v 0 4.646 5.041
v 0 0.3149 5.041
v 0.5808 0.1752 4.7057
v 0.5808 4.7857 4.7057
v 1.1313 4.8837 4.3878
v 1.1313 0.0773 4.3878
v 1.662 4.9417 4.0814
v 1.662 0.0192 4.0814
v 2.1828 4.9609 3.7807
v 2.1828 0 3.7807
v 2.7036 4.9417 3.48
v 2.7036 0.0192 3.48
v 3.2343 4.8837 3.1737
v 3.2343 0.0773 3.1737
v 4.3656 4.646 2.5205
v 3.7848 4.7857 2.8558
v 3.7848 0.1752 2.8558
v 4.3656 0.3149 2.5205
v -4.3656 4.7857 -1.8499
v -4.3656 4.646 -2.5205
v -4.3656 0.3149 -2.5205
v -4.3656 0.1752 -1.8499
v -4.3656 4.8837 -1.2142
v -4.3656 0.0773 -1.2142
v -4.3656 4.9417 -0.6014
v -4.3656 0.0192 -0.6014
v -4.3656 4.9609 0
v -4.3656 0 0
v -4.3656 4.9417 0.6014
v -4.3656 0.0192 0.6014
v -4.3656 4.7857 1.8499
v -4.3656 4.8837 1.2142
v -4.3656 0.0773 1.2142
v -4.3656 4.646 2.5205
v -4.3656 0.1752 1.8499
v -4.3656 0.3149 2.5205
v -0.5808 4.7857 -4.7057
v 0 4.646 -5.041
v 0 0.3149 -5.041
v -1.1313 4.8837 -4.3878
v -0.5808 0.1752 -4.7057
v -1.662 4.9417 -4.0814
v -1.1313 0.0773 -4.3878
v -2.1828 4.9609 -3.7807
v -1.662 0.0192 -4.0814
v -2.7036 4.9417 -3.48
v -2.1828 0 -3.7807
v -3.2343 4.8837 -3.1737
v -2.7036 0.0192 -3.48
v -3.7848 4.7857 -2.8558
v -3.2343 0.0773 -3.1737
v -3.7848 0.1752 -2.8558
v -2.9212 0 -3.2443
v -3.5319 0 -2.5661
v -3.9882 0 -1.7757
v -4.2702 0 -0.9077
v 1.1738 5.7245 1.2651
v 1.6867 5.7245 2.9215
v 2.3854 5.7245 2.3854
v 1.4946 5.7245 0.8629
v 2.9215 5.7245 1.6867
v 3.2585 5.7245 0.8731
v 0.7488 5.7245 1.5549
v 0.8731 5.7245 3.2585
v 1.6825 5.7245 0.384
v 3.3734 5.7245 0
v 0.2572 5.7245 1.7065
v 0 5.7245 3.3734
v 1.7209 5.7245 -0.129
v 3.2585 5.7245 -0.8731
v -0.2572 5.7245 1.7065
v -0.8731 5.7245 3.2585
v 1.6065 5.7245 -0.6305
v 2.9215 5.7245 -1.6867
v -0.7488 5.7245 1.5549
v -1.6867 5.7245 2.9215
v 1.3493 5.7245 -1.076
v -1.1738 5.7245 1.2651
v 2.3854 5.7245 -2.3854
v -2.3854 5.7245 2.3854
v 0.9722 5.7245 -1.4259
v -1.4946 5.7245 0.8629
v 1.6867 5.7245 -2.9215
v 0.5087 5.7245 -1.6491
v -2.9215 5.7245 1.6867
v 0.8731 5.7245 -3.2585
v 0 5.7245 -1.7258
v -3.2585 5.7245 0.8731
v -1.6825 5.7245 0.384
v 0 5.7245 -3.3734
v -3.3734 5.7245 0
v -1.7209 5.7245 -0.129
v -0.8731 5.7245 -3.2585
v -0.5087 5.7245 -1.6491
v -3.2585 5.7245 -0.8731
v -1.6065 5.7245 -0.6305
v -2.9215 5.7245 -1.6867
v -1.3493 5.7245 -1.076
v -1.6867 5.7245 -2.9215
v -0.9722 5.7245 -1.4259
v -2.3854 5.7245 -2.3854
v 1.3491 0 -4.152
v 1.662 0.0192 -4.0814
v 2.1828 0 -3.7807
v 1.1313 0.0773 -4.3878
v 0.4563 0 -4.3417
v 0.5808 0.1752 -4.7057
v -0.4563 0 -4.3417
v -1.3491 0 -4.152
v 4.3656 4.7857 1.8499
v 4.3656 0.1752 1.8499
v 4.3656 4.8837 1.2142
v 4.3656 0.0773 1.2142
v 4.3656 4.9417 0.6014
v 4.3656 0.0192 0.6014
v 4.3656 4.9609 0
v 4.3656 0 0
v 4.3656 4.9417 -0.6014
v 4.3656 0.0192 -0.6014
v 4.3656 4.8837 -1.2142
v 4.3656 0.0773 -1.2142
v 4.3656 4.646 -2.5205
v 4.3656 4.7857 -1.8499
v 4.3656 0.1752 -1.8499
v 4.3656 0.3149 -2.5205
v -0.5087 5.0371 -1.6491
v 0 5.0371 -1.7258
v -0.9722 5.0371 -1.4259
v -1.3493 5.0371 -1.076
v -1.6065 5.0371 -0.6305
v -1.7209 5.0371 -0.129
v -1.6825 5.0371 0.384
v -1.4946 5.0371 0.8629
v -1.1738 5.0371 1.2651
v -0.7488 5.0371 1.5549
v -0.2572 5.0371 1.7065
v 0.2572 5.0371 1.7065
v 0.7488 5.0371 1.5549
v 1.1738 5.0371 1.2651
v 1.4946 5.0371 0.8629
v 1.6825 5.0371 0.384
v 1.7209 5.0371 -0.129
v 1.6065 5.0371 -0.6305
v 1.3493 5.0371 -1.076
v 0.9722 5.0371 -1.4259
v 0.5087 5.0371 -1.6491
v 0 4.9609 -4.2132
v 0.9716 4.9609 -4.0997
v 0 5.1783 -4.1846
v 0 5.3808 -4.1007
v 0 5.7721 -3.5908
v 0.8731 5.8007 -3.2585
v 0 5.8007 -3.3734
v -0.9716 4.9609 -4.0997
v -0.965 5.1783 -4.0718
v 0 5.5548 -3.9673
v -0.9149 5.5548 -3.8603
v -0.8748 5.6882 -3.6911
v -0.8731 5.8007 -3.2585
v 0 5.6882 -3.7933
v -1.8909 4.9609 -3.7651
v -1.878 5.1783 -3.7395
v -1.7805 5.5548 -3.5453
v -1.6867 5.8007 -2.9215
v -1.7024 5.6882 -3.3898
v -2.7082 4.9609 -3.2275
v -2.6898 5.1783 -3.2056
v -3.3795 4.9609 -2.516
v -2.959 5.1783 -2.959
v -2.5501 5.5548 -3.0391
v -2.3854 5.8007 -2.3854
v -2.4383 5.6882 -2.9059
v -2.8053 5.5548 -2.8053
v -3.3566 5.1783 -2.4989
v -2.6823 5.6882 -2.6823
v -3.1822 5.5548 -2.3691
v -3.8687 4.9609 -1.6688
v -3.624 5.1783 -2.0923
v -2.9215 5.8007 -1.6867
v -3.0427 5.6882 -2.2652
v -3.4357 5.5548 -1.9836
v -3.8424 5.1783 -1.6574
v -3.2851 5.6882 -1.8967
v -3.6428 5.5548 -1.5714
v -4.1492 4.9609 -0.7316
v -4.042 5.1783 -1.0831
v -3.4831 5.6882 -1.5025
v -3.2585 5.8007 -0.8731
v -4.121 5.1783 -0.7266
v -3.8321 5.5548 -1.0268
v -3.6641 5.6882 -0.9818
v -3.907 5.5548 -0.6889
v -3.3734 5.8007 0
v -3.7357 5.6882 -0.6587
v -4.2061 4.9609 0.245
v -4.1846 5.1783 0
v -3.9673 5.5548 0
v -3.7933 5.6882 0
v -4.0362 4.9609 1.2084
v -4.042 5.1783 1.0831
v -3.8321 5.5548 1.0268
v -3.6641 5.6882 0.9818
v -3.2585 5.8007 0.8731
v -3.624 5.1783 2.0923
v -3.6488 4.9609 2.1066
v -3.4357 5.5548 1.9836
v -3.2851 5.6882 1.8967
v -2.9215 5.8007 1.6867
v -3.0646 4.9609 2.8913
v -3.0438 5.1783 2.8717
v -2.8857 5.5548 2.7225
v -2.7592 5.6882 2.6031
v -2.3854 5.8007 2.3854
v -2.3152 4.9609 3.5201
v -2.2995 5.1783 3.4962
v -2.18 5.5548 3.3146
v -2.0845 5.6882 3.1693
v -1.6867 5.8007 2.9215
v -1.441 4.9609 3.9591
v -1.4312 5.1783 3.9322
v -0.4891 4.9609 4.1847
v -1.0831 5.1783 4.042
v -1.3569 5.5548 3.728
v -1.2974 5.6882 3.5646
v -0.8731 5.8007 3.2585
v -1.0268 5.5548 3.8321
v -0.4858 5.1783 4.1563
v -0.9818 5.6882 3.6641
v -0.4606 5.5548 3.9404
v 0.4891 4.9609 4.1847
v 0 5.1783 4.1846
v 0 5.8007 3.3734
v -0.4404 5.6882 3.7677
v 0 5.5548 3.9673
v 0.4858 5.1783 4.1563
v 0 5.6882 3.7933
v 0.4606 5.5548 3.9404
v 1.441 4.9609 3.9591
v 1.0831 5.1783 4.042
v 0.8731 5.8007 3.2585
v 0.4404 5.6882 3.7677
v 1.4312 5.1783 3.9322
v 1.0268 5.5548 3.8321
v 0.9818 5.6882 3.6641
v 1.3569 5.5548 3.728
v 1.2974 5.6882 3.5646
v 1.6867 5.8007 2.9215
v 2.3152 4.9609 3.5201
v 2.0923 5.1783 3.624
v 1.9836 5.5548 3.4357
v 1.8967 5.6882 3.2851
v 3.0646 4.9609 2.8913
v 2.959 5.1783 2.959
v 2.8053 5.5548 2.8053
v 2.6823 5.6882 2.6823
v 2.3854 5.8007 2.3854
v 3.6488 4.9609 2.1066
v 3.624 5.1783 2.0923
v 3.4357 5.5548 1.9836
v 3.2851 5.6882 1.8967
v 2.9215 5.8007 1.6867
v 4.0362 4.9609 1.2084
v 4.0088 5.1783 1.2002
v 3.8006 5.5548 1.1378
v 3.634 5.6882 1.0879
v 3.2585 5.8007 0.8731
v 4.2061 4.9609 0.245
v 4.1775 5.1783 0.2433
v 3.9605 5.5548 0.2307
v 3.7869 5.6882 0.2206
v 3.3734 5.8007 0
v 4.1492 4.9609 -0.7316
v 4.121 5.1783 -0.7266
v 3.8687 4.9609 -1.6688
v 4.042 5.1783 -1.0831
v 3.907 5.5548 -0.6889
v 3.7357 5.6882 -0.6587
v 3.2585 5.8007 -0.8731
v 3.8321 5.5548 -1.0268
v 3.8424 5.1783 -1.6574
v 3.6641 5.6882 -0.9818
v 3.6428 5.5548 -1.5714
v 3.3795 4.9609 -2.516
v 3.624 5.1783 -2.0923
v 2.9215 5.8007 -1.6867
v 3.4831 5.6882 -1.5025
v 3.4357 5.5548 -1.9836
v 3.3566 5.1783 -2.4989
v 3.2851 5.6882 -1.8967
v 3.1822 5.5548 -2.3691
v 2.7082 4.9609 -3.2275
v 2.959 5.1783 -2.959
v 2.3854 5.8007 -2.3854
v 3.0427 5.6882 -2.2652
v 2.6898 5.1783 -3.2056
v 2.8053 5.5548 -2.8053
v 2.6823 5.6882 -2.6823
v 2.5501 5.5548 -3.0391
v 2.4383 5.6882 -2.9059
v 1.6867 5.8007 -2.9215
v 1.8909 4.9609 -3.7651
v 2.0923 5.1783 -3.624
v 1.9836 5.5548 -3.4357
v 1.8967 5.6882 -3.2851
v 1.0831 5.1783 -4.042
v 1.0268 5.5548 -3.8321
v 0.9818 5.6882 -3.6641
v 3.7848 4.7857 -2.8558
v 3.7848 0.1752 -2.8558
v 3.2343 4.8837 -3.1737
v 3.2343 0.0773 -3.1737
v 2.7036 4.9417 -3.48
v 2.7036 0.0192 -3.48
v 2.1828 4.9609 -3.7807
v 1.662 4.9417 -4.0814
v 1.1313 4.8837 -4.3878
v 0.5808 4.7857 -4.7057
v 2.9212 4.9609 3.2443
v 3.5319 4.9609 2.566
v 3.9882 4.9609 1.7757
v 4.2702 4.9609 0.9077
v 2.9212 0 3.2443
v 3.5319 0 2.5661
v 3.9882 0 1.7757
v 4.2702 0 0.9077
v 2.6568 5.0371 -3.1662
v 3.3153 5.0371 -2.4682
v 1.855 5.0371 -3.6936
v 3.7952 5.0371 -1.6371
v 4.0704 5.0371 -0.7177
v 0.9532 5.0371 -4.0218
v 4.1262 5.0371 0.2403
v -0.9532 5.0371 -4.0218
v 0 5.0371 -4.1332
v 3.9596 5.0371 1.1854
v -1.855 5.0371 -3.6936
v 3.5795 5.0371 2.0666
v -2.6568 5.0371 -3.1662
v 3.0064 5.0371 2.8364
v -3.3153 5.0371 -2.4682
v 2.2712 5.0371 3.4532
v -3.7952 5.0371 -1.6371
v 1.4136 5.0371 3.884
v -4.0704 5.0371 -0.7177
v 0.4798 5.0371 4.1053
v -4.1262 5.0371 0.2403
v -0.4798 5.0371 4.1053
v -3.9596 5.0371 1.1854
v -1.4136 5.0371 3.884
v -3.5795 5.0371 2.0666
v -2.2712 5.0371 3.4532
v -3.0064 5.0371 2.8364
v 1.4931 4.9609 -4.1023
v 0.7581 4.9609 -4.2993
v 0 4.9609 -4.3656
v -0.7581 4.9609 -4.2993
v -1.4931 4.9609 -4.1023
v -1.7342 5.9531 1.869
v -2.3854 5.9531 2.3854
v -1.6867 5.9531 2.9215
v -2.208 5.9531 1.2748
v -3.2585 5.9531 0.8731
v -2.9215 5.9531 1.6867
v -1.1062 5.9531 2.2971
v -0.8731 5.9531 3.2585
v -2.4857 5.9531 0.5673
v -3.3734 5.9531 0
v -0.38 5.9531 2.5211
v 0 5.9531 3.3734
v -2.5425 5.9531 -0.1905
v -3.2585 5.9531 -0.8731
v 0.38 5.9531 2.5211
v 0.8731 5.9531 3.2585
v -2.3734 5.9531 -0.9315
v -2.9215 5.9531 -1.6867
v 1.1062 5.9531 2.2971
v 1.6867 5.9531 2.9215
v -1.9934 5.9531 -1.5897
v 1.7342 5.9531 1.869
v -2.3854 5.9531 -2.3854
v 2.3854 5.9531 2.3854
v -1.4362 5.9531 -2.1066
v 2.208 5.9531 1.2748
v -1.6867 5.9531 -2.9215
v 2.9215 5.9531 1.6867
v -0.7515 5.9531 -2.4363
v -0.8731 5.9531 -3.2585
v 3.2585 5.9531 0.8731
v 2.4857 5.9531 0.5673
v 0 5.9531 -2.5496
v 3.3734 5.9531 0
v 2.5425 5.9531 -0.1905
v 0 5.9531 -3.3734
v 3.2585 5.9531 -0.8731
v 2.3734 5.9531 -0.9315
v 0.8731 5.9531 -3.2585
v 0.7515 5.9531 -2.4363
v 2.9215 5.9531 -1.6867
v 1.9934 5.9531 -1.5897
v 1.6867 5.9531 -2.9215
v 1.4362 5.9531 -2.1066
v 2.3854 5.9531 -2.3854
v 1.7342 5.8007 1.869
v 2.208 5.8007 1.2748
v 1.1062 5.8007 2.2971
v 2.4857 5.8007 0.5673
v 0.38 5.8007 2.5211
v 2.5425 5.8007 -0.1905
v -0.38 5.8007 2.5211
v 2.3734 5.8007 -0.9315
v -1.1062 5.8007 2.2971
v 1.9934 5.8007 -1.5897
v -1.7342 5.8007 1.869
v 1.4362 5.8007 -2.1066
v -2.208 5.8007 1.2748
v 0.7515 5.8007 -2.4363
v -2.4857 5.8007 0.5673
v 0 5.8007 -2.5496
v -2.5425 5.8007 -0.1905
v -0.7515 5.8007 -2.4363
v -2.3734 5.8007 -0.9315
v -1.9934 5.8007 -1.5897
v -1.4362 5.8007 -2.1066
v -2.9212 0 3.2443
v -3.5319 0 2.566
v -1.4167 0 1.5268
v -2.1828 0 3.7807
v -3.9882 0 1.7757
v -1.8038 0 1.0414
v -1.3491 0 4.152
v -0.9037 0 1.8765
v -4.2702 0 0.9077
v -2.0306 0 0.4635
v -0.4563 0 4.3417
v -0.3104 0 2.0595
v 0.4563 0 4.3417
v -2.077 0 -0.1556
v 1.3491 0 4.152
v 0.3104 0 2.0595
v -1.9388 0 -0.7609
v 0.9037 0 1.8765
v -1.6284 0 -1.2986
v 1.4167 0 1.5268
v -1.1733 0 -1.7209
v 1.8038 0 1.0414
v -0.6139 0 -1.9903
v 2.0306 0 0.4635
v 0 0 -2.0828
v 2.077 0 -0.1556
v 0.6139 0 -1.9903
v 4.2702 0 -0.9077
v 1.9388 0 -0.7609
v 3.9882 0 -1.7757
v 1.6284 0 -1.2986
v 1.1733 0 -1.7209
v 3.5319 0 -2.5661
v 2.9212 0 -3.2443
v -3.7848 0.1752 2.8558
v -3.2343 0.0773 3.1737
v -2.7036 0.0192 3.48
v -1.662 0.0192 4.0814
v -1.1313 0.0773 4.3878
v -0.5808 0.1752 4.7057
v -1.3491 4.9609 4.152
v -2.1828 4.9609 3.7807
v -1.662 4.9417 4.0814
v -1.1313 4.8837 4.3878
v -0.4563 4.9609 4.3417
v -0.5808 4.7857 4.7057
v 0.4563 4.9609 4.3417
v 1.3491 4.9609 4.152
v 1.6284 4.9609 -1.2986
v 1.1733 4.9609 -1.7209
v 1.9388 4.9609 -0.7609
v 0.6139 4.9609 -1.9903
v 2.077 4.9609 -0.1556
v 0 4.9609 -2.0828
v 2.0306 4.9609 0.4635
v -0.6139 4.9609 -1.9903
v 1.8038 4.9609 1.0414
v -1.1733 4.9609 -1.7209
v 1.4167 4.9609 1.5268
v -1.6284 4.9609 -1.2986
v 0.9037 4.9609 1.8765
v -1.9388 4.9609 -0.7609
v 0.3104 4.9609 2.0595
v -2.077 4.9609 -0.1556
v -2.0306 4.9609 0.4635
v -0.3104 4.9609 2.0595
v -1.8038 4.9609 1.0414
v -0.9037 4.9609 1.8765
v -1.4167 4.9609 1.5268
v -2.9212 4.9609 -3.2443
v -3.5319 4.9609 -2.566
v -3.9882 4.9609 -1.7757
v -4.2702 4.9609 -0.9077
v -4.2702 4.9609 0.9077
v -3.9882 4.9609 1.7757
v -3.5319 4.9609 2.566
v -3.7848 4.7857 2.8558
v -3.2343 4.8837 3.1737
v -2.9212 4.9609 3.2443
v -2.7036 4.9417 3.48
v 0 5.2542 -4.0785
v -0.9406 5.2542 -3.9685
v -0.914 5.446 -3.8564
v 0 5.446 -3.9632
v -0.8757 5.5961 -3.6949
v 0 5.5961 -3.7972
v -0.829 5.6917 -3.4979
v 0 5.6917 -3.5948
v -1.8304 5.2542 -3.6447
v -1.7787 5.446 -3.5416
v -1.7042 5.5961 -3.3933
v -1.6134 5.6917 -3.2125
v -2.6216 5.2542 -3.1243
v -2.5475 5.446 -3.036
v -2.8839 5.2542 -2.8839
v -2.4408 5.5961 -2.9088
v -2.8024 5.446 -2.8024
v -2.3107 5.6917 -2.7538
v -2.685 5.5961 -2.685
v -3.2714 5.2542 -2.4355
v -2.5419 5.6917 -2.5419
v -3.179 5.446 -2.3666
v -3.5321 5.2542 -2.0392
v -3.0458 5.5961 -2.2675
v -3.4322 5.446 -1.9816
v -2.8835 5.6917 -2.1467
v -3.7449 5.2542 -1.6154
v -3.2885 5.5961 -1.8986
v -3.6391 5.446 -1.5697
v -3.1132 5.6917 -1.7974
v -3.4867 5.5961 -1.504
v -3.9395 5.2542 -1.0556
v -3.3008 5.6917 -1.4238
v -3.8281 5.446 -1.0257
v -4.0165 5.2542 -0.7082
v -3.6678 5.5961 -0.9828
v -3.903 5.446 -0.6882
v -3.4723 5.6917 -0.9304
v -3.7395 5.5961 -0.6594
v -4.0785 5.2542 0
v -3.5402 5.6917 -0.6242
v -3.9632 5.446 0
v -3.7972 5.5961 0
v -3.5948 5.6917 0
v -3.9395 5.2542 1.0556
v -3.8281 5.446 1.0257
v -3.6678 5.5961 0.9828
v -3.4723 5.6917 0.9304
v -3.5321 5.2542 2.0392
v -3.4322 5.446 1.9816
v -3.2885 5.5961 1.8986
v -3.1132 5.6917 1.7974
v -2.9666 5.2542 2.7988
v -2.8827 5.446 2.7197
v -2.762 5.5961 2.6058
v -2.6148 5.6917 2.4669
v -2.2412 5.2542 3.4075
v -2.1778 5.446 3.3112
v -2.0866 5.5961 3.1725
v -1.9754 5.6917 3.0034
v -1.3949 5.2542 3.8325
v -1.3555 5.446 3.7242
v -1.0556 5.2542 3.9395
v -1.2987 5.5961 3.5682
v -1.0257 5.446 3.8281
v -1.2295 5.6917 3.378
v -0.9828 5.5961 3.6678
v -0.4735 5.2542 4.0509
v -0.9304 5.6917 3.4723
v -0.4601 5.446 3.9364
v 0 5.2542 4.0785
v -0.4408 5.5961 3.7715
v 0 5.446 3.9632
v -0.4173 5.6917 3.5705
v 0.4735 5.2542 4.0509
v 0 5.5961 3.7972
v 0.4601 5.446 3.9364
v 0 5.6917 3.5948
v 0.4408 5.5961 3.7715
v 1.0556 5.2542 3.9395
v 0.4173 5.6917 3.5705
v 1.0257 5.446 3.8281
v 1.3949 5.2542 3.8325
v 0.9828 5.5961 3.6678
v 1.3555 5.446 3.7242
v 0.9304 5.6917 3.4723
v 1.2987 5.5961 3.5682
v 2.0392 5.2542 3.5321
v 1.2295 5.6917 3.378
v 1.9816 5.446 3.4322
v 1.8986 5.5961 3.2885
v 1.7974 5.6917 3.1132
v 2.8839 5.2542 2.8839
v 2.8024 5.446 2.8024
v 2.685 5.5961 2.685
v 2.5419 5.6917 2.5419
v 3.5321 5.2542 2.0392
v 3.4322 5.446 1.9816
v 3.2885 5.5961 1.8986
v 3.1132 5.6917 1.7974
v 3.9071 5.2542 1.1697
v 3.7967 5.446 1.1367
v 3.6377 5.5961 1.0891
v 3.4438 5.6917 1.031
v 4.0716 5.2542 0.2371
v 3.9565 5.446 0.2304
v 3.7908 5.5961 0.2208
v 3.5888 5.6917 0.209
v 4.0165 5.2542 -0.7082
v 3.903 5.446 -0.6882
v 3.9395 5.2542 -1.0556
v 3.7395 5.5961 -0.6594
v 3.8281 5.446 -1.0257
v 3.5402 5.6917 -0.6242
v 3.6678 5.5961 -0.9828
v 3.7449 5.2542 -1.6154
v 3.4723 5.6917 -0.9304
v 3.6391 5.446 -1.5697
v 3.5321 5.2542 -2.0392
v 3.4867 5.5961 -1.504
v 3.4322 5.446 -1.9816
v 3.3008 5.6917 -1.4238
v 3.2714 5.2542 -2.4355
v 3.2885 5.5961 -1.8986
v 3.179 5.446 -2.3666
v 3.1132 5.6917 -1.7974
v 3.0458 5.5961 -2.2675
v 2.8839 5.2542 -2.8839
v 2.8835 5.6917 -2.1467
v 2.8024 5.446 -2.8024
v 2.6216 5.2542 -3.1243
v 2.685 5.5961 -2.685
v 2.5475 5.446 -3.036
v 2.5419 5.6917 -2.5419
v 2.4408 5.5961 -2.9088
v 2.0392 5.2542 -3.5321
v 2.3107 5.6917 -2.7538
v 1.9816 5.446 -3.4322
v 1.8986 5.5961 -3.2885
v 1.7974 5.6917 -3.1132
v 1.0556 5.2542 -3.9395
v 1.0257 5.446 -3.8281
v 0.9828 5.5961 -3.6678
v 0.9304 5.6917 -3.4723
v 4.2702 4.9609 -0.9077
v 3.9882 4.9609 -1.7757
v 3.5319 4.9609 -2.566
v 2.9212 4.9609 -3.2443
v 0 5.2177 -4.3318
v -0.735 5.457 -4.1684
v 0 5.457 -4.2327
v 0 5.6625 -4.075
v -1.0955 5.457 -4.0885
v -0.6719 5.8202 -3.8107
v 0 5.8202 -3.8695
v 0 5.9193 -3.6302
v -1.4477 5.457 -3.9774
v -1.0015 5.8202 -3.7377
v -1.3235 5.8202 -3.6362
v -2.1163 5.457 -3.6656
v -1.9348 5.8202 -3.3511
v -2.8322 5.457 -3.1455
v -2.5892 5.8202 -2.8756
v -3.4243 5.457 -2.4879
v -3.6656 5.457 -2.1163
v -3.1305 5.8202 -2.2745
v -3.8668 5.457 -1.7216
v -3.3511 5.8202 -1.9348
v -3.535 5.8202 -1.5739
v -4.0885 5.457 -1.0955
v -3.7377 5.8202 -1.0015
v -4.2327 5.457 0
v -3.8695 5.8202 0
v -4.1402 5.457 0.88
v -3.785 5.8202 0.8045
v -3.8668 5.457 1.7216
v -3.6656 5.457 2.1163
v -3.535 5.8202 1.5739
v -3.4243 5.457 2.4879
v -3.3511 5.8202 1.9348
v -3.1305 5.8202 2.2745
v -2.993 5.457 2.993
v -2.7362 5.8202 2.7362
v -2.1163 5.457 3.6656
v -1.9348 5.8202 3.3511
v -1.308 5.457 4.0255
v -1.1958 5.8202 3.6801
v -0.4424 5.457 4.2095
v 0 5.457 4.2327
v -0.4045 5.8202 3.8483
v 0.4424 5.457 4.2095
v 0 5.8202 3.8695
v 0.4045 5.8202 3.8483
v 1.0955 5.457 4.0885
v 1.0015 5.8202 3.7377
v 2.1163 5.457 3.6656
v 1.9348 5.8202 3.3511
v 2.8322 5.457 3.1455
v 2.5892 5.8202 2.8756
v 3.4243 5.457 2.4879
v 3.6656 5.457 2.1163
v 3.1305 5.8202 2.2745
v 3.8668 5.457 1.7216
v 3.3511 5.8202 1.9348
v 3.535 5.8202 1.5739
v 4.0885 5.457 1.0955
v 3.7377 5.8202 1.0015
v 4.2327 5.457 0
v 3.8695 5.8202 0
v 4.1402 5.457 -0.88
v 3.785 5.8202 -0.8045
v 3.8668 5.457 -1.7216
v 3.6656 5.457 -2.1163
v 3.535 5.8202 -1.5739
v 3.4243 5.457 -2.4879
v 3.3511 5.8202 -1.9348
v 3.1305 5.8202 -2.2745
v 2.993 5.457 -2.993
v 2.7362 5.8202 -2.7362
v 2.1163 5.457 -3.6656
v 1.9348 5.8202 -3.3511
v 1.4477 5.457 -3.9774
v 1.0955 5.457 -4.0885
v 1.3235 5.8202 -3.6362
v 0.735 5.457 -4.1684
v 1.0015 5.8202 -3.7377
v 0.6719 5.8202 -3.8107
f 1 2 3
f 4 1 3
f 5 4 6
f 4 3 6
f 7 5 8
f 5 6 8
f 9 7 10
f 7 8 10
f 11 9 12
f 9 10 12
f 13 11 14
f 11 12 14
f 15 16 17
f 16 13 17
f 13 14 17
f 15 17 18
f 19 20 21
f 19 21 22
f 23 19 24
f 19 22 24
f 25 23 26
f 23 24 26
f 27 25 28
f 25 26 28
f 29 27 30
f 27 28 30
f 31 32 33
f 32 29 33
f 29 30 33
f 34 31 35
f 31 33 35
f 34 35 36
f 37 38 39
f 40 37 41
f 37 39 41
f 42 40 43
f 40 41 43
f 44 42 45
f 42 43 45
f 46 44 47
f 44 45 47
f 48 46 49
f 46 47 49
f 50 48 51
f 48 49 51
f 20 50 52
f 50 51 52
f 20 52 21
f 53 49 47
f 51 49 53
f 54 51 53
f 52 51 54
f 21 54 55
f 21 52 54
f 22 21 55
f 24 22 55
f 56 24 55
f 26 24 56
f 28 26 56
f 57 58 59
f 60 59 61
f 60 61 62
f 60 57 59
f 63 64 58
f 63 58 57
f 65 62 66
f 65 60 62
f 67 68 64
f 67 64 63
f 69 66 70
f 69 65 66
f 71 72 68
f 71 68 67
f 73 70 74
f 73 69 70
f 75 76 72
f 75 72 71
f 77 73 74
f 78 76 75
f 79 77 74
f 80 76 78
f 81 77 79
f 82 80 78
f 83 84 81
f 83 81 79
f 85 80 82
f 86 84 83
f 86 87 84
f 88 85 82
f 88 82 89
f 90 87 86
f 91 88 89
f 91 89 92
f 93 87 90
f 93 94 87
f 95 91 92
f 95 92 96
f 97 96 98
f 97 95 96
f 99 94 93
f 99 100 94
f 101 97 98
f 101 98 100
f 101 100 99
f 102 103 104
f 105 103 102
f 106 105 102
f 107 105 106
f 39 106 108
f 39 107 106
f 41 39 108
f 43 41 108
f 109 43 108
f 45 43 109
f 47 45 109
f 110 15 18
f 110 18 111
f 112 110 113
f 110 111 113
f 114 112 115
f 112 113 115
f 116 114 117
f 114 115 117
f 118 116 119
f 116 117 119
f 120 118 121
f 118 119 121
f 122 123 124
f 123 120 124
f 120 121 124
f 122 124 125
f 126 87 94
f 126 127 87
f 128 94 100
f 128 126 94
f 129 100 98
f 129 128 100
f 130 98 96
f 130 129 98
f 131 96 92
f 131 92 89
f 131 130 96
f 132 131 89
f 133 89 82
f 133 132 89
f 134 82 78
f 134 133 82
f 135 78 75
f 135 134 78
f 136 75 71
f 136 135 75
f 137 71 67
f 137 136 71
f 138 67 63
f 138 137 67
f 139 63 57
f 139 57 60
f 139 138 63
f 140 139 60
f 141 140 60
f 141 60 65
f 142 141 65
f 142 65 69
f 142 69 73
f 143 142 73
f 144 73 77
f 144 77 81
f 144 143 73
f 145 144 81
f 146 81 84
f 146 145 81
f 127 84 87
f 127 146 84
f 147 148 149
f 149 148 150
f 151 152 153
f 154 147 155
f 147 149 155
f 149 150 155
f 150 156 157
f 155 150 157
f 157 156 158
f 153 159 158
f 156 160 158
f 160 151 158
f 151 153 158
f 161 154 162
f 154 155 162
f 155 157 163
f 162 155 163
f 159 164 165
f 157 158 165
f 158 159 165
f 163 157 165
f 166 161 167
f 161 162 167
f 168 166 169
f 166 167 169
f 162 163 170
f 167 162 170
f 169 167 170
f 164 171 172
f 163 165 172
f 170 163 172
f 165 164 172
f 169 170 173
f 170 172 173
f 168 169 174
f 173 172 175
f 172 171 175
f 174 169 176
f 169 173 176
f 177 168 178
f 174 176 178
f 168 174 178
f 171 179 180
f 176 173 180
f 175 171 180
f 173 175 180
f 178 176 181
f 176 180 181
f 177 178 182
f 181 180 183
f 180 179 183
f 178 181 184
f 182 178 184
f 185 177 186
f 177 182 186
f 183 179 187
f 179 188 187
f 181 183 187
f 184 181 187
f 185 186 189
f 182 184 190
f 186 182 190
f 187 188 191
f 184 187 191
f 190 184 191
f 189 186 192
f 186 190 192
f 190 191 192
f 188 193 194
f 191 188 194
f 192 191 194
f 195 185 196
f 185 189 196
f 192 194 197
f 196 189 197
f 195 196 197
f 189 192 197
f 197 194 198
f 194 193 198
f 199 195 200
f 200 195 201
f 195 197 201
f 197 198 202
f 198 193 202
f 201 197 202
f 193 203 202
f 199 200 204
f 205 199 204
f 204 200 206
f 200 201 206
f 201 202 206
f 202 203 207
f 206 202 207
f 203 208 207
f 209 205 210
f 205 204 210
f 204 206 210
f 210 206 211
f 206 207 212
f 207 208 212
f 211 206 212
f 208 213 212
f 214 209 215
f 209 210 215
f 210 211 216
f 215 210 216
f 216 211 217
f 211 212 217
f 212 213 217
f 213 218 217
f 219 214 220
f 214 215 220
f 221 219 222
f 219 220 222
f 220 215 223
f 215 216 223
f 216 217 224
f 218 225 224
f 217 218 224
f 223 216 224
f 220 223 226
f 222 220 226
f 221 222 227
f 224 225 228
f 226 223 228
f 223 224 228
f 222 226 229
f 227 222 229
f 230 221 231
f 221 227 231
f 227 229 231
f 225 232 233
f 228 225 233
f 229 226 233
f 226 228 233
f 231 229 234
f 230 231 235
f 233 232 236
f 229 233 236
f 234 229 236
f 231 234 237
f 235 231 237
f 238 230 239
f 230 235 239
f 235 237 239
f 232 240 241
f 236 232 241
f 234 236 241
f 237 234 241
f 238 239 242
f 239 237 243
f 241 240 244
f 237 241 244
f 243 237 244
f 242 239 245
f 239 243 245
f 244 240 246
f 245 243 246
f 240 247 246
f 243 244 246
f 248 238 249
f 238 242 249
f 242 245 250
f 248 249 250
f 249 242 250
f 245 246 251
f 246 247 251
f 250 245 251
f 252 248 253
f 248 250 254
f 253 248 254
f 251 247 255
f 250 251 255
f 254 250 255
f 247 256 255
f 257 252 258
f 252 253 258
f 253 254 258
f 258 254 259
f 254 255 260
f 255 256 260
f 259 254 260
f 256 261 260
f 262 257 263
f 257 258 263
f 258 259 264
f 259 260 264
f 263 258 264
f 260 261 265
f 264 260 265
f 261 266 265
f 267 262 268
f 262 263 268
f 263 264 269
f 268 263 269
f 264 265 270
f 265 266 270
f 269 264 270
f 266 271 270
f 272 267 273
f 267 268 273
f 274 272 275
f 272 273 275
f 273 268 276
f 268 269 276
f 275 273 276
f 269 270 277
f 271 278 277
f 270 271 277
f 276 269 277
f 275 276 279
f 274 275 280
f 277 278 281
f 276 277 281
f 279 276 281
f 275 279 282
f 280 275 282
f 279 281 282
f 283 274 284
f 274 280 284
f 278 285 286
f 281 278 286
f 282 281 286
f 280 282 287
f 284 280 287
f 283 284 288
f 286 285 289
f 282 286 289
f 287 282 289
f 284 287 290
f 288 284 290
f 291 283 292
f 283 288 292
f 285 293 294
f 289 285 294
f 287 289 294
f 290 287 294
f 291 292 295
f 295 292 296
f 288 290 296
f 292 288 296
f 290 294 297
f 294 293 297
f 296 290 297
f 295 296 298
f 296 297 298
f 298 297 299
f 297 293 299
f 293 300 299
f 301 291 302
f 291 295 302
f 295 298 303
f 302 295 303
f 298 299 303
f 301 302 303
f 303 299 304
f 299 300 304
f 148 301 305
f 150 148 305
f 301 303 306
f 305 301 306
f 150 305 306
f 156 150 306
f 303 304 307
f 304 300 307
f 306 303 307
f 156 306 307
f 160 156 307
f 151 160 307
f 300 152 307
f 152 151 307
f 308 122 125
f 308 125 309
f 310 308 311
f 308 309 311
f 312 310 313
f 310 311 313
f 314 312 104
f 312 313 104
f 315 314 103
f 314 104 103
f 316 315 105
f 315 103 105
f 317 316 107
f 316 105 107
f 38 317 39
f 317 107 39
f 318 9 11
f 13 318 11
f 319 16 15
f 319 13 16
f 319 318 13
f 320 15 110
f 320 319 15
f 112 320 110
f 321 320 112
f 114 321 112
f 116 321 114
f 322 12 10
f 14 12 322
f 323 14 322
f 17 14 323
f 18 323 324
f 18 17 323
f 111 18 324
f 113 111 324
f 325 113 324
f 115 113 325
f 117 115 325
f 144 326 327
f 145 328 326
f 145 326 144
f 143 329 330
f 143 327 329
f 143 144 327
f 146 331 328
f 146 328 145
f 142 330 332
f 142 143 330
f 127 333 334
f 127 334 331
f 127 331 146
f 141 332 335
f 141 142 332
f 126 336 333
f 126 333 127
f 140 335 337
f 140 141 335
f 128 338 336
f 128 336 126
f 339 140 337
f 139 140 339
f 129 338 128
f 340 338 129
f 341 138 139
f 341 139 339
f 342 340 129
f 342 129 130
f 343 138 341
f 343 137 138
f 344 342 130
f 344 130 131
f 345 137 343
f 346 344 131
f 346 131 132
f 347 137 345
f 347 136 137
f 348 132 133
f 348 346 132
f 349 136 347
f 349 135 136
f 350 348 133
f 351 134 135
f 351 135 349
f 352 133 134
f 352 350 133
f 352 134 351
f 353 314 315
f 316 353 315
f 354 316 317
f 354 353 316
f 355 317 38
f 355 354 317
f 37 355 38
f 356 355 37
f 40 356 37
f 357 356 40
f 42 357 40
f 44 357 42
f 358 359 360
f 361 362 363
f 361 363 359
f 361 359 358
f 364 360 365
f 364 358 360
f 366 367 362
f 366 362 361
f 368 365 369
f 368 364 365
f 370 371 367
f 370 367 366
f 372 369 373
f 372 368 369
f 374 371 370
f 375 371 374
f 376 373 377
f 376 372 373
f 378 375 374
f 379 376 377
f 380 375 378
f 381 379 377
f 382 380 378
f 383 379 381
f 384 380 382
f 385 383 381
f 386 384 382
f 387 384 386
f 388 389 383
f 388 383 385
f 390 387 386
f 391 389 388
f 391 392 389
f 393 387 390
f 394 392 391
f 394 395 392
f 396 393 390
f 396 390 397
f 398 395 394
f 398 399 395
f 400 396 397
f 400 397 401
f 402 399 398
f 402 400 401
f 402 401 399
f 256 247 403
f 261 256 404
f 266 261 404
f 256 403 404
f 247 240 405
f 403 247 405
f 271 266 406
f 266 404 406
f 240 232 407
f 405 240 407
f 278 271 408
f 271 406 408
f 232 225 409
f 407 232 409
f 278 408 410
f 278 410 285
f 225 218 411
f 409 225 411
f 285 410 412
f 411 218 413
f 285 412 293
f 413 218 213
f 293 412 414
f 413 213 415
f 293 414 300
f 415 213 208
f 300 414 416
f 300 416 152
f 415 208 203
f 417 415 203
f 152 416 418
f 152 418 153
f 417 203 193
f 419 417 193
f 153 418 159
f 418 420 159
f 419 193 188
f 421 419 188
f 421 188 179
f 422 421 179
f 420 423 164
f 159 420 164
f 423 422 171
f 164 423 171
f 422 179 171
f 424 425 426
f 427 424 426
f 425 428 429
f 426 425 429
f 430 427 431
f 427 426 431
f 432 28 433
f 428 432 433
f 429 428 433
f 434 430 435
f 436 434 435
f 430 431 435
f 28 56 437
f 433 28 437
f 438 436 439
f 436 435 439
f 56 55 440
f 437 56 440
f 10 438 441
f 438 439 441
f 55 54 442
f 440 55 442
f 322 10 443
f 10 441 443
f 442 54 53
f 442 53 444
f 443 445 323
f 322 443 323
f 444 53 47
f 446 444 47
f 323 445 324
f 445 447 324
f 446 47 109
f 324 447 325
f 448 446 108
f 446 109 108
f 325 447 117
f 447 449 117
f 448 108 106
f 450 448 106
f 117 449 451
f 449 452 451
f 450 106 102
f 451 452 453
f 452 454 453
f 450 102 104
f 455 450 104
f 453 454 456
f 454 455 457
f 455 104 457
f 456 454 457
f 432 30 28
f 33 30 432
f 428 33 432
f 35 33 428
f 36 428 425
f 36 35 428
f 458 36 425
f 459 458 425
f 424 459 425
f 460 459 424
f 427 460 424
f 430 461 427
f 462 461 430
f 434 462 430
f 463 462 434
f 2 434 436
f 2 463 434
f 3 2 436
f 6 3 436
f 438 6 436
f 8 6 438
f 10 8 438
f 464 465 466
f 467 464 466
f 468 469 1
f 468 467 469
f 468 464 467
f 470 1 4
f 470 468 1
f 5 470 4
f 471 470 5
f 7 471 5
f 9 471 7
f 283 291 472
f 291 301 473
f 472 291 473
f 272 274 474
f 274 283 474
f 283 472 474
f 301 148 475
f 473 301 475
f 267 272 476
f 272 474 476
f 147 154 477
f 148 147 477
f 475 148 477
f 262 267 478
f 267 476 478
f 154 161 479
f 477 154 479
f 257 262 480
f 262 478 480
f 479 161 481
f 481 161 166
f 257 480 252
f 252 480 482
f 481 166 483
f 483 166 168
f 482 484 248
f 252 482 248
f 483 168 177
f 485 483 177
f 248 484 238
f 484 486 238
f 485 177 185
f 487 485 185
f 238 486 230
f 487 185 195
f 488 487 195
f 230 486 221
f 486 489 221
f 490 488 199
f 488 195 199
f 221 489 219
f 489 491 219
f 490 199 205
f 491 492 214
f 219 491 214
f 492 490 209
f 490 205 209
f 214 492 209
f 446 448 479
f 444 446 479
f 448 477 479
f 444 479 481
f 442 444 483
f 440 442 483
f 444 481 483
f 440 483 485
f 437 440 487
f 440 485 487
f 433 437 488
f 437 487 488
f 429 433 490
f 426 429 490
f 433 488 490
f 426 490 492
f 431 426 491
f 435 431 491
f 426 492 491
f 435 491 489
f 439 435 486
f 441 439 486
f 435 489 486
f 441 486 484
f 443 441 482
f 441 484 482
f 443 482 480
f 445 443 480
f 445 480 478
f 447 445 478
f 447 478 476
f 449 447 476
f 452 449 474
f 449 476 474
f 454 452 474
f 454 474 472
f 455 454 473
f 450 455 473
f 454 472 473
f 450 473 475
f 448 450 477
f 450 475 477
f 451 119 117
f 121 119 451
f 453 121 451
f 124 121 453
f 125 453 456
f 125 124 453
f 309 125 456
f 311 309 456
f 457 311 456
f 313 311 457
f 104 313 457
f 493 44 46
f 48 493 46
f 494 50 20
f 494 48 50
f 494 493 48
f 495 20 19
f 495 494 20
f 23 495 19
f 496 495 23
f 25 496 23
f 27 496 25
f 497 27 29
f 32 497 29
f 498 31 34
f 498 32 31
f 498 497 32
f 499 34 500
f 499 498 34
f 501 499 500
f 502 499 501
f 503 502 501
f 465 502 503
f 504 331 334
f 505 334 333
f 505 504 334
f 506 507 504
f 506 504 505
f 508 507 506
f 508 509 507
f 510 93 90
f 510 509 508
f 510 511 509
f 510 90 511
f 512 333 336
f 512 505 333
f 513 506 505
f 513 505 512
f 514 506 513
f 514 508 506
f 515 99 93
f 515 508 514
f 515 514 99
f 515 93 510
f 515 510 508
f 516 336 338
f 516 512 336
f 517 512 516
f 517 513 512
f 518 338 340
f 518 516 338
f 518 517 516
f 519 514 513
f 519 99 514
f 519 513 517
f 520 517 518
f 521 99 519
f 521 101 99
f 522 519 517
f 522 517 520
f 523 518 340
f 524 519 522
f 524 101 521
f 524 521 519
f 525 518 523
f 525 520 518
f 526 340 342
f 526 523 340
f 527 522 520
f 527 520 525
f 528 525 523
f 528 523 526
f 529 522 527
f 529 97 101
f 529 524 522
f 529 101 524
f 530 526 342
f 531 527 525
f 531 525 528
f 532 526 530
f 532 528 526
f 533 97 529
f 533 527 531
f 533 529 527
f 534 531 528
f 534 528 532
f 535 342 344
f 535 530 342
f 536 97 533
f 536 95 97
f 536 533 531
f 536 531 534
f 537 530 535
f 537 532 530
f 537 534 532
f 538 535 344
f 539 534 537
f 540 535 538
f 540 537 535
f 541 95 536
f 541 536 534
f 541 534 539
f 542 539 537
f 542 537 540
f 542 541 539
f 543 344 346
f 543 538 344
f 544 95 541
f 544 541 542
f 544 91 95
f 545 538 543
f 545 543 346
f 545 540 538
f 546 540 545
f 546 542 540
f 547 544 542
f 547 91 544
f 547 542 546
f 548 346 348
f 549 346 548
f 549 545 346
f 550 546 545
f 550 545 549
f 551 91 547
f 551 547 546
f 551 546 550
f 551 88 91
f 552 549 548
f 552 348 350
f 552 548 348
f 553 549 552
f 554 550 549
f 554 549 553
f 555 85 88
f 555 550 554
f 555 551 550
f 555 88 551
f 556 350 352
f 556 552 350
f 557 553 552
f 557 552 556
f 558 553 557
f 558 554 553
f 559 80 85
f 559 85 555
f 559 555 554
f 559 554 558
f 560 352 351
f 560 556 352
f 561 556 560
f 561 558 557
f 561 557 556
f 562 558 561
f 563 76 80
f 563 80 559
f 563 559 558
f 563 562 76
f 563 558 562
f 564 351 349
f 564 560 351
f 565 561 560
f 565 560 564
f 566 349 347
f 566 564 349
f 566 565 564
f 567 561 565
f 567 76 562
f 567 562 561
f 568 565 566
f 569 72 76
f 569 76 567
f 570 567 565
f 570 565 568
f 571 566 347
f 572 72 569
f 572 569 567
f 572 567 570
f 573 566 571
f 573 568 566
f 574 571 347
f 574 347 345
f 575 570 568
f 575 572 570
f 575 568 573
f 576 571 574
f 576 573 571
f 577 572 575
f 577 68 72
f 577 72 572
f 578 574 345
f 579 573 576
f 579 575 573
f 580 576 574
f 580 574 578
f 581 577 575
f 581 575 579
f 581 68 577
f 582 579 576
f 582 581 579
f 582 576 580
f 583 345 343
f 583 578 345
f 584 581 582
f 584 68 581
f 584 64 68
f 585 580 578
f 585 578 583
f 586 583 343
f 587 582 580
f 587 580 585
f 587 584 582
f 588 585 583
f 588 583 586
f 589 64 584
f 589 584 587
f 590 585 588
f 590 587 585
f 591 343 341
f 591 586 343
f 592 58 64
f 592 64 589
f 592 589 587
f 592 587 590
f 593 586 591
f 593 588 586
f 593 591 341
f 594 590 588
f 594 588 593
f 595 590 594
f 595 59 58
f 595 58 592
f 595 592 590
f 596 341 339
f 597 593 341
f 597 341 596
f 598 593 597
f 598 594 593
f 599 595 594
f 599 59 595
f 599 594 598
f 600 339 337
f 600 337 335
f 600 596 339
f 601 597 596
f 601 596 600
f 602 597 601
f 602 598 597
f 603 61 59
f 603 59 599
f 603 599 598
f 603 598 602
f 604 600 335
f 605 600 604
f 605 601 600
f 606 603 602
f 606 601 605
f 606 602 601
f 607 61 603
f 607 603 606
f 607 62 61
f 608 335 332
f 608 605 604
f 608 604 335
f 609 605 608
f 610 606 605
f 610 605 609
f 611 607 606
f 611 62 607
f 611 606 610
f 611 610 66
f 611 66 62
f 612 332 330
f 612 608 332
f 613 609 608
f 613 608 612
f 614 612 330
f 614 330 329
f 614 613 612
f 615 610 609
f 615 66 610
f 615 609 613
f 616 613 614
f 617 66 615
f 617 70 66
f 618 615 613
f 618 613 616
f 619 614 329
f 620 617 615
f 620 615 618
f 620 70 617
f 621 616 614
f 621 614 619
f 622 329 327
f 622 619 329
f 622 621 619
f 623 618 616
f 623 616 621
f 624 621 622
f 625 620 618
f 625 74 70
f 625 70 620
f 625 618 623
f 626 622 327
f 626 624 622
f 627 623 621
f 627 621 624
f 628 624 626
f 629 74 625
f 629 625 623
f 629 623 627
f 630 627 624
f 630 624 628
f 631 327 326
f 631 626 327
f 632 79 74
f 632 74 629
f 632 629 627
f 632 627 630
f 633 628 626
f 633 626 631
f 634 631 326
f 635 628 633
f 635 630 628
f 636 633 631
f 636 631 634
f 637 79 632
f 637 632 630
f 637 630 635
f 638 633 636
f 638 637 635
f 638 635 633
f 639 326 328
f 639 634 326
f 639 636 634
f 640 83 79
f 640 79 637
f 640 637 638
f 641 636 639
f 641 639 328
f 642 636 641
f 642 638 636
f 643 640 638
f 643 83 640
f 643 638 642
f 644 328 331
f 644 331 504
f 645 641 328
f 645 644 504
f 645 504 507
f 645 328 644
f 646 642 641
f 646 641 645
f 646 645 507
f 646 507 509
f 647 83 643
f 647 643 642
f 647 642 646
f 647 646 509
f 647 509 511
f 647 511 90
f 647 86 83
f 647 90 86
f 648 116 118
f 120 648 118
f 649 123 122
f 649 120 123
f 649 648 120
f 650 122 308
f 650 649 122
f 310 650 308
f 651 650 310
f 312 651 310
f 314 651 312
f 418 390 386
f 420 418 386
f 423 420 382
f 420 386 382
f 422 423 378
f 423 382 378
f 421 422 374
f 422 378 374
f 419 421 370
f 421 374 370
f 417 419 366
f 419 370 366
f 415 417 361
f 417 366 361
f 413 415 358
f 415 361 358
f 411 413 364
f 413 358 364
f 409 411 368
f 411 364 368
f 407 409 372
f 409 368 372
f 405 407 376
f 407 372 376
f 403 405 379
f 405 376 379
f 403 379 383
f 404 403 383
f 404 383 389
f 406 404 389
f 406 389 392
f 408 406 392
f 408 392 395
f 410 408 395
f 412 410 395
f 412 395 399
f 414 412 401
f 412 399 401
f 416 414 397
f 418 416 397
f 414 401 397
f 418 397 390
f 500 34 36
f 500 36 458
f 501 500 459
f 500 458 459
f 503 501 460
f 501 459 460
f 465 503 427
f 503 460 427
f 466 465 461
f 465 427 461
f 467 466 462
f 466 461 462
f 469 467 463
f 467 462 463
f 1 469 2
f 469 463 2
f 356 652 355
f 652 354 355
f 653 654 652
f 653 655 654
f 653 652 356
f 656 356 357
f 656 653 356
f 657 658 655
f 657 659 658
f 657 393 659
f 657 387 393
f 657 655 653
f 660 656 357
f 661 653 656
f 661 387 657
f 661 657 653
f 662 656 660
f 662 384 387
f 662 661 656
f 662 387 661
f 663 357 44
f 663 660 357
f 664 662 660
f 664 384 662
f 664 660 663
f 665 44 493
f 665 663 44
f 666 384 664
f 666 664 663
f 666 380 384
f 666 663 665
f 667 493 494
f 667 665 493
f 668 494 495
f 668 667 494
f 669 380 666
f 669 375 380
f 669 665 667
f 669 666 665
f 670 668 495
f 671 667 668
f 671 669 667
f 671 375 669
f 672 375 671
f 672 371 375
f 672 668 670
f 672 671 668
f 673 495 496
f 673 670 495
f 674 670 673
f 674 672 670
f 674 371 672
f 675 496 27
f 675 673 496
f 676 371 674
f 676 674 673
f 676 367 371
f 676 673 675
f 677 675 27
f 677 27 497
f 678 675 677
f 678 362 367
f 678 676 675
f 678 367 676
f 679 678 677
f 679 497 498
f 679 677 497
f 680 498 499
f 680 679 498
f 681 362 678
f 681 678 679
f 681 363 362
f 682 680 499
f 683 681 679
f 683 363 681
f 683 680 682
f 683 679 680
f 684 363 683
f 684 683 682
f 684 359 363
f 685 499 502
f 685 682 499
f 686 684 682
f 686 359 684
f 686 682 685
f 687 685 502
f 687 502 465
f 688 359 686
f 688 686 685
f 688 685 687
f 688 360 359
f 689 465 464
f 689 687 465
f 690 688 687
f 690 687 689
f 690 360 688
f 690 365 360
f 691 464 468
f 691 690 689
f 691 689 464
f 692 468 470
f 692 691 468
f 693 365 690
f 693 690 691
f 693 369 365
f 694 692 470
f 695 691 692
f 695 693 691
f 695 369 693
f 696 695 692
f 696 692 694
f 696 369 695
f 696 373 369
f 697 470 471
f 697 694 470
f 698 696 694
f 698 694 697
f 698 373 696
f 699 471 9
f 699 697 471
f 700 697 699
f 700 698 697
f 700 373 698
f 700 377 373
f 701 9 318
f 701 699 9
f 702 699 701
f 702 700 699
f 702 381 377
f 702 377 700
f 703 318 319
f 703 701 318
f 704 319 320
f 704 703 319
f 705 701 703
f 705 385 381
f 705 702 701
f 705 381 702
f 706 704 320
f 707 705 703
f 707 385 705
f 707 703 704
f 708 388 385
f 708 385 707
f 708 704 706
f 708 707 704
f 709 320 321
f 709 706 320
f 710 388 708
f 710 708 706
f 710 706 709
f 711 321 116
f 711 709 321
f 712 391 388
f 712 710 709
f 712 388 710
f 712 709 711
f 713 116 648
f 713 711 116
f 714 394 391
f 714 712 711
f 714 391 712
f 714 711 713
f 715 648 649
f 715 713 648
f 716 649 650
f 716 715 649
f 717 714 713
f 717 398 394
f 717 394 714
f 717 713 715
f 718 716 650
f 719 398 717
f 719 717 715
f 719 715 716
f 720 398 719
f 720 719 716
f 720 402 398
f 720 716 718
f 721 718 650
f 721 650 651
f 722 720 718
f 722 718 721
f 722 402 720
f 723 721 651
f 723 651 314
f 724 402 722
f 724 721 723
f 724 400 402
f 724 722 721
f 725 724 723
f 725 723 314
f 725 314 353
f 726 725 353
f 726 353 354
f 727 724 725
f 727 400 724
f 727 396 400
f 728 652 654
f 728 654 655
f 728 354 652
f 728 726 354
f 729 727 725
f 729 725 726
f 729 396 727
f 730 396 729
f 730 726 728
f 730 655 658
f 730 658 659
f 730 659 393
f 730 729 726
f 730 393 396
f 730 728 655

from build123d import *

# Parameters (mm, degrees)
EXTRUDE1_DEPTH = 5.953125
SKETCH2_W      = 2.0828
SKETCH2_H      = 5.953125


with BuildPart() as part:
    # Sketch1 → Extrude1 (new body)
    with BuildSketch(Plane(origin=(0, 0, 0), x_dir=(1, 0, 0), z_dir=(0, 1, 0))):
        Polygon((0, 5.040989538), (-4.365625, 2.520494769), (-4.365625, -2.520494769), (0, -5.040989538), (4.365625, -2.520494769), (4.365625, 2.520494769), align=None)
    extrude(amount=EXTRUDE1_DEPTH)

    # Sketch4 → Cut-Revolve2 (revolve, cut)
    with BuildSketch(Plane(origin=(0, 0, 0), x_dir=(0, 0, -1), z_dir=(1, 0, 0))):
        Polygon((0, 5.953125), (2.0828, 5.953125), (1.725765218, 5.786636947), (1.725765218, 0.166488053), (2.0828, 0), (0, 0), align=None)
    revolve(axis=Axis((0, 5.953125, 0), (0, 1, 0)), mode=Mode.SUBTRACT)


with BuildPart() as body_2:
    # Sketch2 → Revolve1 (revolve)
    with BuildSketch(Plane(origin=(0, 0, 0), x_dir=(0, 0, -1), z_dir=(1, 0, 0))):
        with Locations((1.0414, 2.9765625)):
            Rectangle(SKETCH2_W, SKETCH2_H)
    revolve(axis=Axis((0, -2.0828, 0), (0, 1, 0)))


with BuildPart() as part_1:
    add(part.part)

    # Combine1: cut body 2
    add(body_2.part, mode=Mode.SUBTRACT)

    # Sketch5 → Cut-Revolve3 (revolve, cut)
    with BuildSketch(Plane(origin=(0, 0, 0), x_dir=(0, 0, -1), z_dir=(1, 0, 0))):
        with BuildLine():
            Line((0, 0), (4.365625, 0))
            Line((4.365625, 0), (5.040989538, 0.314927656))
            Line((5.040989538, 0.314927656), (5.040989538, 4.646009844))
            Line((5.040989538, 4.646009844), (4.365625, 4.9609375))
            ThreePointArc((4.365625, 4.9609375), (4.075020009, 5.662520009), (3.3734375, 5.953125))
            Line((3.3734375, 5.953125), (3.3734375, 7.223125))
            Line((3.3734375, 7.223125), (6.310989538, 7.223125))
            Line((6.310989538, 7.223125), (6.310989538, -1.27))
            Line((6.310989538, -1.27), (0, -1.27))
            Line((0, -1.27), (0, 0))
        make_face()
    revolve(axis=Axis((0, 0, 0), (0, 1, 0)), mode=Mode.SUBTRACT)

    # Sketch6 → Cut-Revolve4 (revolve, cut)
    with BuildSketch(Plane(origin=(0, 0, 0), x_dir=(0, 0, -1), z_dir=(1, 0, 0))):
        with BuildLine():
            Line((0, 4.9609375), (4.213225, 4.9609375))
            ThreePointArc((4.213225, 4.9609375), (3.967256936, 5.554756936), (3.3734375, 5.800725))
            Line((3.3734375, 5.800725), (2.549601359, 5.800725))
            Line((2.549601359, 5.800725), (2.549601359, 7.223125))
            Line((2.549601359, 7.223125), (0, 7.223125))
            Line((0, 7.223125), (0, 4.9609375))
        make_face()
    revolve(axis=Axis((0, 7.223125, 0), (0, 1, 0)), mode=Mode.SUBTRACT)


with BuildPart() as body_2_2:
    # Sketch7 → Revolve2 (revolve)
    with BuildSketch(Plane(origin=(0, 0, 0), x_dir=(0, 0, -1), z_dir=(1, 0, 0))):
        with BuildLine():
            Line((1.725765218, 5.0371375), (4.133213408, 5.0371375))
            ThreePointArc((4.133213408, 5.0371375), (3.885726726, 5.527175629), (3.3734375, 5.724525))
            Line((3.3734375, 5.724525), (1.725765218, 5.724525))
            Line((1.725765218, 5.724525), (1.725765218, 5.0371375))
        make_face()
    revolve(axis=Axis((0, 5.0371375, 0), (0, 1, 0)))


solid = Compound([part_1.part, body_2_2.part])
